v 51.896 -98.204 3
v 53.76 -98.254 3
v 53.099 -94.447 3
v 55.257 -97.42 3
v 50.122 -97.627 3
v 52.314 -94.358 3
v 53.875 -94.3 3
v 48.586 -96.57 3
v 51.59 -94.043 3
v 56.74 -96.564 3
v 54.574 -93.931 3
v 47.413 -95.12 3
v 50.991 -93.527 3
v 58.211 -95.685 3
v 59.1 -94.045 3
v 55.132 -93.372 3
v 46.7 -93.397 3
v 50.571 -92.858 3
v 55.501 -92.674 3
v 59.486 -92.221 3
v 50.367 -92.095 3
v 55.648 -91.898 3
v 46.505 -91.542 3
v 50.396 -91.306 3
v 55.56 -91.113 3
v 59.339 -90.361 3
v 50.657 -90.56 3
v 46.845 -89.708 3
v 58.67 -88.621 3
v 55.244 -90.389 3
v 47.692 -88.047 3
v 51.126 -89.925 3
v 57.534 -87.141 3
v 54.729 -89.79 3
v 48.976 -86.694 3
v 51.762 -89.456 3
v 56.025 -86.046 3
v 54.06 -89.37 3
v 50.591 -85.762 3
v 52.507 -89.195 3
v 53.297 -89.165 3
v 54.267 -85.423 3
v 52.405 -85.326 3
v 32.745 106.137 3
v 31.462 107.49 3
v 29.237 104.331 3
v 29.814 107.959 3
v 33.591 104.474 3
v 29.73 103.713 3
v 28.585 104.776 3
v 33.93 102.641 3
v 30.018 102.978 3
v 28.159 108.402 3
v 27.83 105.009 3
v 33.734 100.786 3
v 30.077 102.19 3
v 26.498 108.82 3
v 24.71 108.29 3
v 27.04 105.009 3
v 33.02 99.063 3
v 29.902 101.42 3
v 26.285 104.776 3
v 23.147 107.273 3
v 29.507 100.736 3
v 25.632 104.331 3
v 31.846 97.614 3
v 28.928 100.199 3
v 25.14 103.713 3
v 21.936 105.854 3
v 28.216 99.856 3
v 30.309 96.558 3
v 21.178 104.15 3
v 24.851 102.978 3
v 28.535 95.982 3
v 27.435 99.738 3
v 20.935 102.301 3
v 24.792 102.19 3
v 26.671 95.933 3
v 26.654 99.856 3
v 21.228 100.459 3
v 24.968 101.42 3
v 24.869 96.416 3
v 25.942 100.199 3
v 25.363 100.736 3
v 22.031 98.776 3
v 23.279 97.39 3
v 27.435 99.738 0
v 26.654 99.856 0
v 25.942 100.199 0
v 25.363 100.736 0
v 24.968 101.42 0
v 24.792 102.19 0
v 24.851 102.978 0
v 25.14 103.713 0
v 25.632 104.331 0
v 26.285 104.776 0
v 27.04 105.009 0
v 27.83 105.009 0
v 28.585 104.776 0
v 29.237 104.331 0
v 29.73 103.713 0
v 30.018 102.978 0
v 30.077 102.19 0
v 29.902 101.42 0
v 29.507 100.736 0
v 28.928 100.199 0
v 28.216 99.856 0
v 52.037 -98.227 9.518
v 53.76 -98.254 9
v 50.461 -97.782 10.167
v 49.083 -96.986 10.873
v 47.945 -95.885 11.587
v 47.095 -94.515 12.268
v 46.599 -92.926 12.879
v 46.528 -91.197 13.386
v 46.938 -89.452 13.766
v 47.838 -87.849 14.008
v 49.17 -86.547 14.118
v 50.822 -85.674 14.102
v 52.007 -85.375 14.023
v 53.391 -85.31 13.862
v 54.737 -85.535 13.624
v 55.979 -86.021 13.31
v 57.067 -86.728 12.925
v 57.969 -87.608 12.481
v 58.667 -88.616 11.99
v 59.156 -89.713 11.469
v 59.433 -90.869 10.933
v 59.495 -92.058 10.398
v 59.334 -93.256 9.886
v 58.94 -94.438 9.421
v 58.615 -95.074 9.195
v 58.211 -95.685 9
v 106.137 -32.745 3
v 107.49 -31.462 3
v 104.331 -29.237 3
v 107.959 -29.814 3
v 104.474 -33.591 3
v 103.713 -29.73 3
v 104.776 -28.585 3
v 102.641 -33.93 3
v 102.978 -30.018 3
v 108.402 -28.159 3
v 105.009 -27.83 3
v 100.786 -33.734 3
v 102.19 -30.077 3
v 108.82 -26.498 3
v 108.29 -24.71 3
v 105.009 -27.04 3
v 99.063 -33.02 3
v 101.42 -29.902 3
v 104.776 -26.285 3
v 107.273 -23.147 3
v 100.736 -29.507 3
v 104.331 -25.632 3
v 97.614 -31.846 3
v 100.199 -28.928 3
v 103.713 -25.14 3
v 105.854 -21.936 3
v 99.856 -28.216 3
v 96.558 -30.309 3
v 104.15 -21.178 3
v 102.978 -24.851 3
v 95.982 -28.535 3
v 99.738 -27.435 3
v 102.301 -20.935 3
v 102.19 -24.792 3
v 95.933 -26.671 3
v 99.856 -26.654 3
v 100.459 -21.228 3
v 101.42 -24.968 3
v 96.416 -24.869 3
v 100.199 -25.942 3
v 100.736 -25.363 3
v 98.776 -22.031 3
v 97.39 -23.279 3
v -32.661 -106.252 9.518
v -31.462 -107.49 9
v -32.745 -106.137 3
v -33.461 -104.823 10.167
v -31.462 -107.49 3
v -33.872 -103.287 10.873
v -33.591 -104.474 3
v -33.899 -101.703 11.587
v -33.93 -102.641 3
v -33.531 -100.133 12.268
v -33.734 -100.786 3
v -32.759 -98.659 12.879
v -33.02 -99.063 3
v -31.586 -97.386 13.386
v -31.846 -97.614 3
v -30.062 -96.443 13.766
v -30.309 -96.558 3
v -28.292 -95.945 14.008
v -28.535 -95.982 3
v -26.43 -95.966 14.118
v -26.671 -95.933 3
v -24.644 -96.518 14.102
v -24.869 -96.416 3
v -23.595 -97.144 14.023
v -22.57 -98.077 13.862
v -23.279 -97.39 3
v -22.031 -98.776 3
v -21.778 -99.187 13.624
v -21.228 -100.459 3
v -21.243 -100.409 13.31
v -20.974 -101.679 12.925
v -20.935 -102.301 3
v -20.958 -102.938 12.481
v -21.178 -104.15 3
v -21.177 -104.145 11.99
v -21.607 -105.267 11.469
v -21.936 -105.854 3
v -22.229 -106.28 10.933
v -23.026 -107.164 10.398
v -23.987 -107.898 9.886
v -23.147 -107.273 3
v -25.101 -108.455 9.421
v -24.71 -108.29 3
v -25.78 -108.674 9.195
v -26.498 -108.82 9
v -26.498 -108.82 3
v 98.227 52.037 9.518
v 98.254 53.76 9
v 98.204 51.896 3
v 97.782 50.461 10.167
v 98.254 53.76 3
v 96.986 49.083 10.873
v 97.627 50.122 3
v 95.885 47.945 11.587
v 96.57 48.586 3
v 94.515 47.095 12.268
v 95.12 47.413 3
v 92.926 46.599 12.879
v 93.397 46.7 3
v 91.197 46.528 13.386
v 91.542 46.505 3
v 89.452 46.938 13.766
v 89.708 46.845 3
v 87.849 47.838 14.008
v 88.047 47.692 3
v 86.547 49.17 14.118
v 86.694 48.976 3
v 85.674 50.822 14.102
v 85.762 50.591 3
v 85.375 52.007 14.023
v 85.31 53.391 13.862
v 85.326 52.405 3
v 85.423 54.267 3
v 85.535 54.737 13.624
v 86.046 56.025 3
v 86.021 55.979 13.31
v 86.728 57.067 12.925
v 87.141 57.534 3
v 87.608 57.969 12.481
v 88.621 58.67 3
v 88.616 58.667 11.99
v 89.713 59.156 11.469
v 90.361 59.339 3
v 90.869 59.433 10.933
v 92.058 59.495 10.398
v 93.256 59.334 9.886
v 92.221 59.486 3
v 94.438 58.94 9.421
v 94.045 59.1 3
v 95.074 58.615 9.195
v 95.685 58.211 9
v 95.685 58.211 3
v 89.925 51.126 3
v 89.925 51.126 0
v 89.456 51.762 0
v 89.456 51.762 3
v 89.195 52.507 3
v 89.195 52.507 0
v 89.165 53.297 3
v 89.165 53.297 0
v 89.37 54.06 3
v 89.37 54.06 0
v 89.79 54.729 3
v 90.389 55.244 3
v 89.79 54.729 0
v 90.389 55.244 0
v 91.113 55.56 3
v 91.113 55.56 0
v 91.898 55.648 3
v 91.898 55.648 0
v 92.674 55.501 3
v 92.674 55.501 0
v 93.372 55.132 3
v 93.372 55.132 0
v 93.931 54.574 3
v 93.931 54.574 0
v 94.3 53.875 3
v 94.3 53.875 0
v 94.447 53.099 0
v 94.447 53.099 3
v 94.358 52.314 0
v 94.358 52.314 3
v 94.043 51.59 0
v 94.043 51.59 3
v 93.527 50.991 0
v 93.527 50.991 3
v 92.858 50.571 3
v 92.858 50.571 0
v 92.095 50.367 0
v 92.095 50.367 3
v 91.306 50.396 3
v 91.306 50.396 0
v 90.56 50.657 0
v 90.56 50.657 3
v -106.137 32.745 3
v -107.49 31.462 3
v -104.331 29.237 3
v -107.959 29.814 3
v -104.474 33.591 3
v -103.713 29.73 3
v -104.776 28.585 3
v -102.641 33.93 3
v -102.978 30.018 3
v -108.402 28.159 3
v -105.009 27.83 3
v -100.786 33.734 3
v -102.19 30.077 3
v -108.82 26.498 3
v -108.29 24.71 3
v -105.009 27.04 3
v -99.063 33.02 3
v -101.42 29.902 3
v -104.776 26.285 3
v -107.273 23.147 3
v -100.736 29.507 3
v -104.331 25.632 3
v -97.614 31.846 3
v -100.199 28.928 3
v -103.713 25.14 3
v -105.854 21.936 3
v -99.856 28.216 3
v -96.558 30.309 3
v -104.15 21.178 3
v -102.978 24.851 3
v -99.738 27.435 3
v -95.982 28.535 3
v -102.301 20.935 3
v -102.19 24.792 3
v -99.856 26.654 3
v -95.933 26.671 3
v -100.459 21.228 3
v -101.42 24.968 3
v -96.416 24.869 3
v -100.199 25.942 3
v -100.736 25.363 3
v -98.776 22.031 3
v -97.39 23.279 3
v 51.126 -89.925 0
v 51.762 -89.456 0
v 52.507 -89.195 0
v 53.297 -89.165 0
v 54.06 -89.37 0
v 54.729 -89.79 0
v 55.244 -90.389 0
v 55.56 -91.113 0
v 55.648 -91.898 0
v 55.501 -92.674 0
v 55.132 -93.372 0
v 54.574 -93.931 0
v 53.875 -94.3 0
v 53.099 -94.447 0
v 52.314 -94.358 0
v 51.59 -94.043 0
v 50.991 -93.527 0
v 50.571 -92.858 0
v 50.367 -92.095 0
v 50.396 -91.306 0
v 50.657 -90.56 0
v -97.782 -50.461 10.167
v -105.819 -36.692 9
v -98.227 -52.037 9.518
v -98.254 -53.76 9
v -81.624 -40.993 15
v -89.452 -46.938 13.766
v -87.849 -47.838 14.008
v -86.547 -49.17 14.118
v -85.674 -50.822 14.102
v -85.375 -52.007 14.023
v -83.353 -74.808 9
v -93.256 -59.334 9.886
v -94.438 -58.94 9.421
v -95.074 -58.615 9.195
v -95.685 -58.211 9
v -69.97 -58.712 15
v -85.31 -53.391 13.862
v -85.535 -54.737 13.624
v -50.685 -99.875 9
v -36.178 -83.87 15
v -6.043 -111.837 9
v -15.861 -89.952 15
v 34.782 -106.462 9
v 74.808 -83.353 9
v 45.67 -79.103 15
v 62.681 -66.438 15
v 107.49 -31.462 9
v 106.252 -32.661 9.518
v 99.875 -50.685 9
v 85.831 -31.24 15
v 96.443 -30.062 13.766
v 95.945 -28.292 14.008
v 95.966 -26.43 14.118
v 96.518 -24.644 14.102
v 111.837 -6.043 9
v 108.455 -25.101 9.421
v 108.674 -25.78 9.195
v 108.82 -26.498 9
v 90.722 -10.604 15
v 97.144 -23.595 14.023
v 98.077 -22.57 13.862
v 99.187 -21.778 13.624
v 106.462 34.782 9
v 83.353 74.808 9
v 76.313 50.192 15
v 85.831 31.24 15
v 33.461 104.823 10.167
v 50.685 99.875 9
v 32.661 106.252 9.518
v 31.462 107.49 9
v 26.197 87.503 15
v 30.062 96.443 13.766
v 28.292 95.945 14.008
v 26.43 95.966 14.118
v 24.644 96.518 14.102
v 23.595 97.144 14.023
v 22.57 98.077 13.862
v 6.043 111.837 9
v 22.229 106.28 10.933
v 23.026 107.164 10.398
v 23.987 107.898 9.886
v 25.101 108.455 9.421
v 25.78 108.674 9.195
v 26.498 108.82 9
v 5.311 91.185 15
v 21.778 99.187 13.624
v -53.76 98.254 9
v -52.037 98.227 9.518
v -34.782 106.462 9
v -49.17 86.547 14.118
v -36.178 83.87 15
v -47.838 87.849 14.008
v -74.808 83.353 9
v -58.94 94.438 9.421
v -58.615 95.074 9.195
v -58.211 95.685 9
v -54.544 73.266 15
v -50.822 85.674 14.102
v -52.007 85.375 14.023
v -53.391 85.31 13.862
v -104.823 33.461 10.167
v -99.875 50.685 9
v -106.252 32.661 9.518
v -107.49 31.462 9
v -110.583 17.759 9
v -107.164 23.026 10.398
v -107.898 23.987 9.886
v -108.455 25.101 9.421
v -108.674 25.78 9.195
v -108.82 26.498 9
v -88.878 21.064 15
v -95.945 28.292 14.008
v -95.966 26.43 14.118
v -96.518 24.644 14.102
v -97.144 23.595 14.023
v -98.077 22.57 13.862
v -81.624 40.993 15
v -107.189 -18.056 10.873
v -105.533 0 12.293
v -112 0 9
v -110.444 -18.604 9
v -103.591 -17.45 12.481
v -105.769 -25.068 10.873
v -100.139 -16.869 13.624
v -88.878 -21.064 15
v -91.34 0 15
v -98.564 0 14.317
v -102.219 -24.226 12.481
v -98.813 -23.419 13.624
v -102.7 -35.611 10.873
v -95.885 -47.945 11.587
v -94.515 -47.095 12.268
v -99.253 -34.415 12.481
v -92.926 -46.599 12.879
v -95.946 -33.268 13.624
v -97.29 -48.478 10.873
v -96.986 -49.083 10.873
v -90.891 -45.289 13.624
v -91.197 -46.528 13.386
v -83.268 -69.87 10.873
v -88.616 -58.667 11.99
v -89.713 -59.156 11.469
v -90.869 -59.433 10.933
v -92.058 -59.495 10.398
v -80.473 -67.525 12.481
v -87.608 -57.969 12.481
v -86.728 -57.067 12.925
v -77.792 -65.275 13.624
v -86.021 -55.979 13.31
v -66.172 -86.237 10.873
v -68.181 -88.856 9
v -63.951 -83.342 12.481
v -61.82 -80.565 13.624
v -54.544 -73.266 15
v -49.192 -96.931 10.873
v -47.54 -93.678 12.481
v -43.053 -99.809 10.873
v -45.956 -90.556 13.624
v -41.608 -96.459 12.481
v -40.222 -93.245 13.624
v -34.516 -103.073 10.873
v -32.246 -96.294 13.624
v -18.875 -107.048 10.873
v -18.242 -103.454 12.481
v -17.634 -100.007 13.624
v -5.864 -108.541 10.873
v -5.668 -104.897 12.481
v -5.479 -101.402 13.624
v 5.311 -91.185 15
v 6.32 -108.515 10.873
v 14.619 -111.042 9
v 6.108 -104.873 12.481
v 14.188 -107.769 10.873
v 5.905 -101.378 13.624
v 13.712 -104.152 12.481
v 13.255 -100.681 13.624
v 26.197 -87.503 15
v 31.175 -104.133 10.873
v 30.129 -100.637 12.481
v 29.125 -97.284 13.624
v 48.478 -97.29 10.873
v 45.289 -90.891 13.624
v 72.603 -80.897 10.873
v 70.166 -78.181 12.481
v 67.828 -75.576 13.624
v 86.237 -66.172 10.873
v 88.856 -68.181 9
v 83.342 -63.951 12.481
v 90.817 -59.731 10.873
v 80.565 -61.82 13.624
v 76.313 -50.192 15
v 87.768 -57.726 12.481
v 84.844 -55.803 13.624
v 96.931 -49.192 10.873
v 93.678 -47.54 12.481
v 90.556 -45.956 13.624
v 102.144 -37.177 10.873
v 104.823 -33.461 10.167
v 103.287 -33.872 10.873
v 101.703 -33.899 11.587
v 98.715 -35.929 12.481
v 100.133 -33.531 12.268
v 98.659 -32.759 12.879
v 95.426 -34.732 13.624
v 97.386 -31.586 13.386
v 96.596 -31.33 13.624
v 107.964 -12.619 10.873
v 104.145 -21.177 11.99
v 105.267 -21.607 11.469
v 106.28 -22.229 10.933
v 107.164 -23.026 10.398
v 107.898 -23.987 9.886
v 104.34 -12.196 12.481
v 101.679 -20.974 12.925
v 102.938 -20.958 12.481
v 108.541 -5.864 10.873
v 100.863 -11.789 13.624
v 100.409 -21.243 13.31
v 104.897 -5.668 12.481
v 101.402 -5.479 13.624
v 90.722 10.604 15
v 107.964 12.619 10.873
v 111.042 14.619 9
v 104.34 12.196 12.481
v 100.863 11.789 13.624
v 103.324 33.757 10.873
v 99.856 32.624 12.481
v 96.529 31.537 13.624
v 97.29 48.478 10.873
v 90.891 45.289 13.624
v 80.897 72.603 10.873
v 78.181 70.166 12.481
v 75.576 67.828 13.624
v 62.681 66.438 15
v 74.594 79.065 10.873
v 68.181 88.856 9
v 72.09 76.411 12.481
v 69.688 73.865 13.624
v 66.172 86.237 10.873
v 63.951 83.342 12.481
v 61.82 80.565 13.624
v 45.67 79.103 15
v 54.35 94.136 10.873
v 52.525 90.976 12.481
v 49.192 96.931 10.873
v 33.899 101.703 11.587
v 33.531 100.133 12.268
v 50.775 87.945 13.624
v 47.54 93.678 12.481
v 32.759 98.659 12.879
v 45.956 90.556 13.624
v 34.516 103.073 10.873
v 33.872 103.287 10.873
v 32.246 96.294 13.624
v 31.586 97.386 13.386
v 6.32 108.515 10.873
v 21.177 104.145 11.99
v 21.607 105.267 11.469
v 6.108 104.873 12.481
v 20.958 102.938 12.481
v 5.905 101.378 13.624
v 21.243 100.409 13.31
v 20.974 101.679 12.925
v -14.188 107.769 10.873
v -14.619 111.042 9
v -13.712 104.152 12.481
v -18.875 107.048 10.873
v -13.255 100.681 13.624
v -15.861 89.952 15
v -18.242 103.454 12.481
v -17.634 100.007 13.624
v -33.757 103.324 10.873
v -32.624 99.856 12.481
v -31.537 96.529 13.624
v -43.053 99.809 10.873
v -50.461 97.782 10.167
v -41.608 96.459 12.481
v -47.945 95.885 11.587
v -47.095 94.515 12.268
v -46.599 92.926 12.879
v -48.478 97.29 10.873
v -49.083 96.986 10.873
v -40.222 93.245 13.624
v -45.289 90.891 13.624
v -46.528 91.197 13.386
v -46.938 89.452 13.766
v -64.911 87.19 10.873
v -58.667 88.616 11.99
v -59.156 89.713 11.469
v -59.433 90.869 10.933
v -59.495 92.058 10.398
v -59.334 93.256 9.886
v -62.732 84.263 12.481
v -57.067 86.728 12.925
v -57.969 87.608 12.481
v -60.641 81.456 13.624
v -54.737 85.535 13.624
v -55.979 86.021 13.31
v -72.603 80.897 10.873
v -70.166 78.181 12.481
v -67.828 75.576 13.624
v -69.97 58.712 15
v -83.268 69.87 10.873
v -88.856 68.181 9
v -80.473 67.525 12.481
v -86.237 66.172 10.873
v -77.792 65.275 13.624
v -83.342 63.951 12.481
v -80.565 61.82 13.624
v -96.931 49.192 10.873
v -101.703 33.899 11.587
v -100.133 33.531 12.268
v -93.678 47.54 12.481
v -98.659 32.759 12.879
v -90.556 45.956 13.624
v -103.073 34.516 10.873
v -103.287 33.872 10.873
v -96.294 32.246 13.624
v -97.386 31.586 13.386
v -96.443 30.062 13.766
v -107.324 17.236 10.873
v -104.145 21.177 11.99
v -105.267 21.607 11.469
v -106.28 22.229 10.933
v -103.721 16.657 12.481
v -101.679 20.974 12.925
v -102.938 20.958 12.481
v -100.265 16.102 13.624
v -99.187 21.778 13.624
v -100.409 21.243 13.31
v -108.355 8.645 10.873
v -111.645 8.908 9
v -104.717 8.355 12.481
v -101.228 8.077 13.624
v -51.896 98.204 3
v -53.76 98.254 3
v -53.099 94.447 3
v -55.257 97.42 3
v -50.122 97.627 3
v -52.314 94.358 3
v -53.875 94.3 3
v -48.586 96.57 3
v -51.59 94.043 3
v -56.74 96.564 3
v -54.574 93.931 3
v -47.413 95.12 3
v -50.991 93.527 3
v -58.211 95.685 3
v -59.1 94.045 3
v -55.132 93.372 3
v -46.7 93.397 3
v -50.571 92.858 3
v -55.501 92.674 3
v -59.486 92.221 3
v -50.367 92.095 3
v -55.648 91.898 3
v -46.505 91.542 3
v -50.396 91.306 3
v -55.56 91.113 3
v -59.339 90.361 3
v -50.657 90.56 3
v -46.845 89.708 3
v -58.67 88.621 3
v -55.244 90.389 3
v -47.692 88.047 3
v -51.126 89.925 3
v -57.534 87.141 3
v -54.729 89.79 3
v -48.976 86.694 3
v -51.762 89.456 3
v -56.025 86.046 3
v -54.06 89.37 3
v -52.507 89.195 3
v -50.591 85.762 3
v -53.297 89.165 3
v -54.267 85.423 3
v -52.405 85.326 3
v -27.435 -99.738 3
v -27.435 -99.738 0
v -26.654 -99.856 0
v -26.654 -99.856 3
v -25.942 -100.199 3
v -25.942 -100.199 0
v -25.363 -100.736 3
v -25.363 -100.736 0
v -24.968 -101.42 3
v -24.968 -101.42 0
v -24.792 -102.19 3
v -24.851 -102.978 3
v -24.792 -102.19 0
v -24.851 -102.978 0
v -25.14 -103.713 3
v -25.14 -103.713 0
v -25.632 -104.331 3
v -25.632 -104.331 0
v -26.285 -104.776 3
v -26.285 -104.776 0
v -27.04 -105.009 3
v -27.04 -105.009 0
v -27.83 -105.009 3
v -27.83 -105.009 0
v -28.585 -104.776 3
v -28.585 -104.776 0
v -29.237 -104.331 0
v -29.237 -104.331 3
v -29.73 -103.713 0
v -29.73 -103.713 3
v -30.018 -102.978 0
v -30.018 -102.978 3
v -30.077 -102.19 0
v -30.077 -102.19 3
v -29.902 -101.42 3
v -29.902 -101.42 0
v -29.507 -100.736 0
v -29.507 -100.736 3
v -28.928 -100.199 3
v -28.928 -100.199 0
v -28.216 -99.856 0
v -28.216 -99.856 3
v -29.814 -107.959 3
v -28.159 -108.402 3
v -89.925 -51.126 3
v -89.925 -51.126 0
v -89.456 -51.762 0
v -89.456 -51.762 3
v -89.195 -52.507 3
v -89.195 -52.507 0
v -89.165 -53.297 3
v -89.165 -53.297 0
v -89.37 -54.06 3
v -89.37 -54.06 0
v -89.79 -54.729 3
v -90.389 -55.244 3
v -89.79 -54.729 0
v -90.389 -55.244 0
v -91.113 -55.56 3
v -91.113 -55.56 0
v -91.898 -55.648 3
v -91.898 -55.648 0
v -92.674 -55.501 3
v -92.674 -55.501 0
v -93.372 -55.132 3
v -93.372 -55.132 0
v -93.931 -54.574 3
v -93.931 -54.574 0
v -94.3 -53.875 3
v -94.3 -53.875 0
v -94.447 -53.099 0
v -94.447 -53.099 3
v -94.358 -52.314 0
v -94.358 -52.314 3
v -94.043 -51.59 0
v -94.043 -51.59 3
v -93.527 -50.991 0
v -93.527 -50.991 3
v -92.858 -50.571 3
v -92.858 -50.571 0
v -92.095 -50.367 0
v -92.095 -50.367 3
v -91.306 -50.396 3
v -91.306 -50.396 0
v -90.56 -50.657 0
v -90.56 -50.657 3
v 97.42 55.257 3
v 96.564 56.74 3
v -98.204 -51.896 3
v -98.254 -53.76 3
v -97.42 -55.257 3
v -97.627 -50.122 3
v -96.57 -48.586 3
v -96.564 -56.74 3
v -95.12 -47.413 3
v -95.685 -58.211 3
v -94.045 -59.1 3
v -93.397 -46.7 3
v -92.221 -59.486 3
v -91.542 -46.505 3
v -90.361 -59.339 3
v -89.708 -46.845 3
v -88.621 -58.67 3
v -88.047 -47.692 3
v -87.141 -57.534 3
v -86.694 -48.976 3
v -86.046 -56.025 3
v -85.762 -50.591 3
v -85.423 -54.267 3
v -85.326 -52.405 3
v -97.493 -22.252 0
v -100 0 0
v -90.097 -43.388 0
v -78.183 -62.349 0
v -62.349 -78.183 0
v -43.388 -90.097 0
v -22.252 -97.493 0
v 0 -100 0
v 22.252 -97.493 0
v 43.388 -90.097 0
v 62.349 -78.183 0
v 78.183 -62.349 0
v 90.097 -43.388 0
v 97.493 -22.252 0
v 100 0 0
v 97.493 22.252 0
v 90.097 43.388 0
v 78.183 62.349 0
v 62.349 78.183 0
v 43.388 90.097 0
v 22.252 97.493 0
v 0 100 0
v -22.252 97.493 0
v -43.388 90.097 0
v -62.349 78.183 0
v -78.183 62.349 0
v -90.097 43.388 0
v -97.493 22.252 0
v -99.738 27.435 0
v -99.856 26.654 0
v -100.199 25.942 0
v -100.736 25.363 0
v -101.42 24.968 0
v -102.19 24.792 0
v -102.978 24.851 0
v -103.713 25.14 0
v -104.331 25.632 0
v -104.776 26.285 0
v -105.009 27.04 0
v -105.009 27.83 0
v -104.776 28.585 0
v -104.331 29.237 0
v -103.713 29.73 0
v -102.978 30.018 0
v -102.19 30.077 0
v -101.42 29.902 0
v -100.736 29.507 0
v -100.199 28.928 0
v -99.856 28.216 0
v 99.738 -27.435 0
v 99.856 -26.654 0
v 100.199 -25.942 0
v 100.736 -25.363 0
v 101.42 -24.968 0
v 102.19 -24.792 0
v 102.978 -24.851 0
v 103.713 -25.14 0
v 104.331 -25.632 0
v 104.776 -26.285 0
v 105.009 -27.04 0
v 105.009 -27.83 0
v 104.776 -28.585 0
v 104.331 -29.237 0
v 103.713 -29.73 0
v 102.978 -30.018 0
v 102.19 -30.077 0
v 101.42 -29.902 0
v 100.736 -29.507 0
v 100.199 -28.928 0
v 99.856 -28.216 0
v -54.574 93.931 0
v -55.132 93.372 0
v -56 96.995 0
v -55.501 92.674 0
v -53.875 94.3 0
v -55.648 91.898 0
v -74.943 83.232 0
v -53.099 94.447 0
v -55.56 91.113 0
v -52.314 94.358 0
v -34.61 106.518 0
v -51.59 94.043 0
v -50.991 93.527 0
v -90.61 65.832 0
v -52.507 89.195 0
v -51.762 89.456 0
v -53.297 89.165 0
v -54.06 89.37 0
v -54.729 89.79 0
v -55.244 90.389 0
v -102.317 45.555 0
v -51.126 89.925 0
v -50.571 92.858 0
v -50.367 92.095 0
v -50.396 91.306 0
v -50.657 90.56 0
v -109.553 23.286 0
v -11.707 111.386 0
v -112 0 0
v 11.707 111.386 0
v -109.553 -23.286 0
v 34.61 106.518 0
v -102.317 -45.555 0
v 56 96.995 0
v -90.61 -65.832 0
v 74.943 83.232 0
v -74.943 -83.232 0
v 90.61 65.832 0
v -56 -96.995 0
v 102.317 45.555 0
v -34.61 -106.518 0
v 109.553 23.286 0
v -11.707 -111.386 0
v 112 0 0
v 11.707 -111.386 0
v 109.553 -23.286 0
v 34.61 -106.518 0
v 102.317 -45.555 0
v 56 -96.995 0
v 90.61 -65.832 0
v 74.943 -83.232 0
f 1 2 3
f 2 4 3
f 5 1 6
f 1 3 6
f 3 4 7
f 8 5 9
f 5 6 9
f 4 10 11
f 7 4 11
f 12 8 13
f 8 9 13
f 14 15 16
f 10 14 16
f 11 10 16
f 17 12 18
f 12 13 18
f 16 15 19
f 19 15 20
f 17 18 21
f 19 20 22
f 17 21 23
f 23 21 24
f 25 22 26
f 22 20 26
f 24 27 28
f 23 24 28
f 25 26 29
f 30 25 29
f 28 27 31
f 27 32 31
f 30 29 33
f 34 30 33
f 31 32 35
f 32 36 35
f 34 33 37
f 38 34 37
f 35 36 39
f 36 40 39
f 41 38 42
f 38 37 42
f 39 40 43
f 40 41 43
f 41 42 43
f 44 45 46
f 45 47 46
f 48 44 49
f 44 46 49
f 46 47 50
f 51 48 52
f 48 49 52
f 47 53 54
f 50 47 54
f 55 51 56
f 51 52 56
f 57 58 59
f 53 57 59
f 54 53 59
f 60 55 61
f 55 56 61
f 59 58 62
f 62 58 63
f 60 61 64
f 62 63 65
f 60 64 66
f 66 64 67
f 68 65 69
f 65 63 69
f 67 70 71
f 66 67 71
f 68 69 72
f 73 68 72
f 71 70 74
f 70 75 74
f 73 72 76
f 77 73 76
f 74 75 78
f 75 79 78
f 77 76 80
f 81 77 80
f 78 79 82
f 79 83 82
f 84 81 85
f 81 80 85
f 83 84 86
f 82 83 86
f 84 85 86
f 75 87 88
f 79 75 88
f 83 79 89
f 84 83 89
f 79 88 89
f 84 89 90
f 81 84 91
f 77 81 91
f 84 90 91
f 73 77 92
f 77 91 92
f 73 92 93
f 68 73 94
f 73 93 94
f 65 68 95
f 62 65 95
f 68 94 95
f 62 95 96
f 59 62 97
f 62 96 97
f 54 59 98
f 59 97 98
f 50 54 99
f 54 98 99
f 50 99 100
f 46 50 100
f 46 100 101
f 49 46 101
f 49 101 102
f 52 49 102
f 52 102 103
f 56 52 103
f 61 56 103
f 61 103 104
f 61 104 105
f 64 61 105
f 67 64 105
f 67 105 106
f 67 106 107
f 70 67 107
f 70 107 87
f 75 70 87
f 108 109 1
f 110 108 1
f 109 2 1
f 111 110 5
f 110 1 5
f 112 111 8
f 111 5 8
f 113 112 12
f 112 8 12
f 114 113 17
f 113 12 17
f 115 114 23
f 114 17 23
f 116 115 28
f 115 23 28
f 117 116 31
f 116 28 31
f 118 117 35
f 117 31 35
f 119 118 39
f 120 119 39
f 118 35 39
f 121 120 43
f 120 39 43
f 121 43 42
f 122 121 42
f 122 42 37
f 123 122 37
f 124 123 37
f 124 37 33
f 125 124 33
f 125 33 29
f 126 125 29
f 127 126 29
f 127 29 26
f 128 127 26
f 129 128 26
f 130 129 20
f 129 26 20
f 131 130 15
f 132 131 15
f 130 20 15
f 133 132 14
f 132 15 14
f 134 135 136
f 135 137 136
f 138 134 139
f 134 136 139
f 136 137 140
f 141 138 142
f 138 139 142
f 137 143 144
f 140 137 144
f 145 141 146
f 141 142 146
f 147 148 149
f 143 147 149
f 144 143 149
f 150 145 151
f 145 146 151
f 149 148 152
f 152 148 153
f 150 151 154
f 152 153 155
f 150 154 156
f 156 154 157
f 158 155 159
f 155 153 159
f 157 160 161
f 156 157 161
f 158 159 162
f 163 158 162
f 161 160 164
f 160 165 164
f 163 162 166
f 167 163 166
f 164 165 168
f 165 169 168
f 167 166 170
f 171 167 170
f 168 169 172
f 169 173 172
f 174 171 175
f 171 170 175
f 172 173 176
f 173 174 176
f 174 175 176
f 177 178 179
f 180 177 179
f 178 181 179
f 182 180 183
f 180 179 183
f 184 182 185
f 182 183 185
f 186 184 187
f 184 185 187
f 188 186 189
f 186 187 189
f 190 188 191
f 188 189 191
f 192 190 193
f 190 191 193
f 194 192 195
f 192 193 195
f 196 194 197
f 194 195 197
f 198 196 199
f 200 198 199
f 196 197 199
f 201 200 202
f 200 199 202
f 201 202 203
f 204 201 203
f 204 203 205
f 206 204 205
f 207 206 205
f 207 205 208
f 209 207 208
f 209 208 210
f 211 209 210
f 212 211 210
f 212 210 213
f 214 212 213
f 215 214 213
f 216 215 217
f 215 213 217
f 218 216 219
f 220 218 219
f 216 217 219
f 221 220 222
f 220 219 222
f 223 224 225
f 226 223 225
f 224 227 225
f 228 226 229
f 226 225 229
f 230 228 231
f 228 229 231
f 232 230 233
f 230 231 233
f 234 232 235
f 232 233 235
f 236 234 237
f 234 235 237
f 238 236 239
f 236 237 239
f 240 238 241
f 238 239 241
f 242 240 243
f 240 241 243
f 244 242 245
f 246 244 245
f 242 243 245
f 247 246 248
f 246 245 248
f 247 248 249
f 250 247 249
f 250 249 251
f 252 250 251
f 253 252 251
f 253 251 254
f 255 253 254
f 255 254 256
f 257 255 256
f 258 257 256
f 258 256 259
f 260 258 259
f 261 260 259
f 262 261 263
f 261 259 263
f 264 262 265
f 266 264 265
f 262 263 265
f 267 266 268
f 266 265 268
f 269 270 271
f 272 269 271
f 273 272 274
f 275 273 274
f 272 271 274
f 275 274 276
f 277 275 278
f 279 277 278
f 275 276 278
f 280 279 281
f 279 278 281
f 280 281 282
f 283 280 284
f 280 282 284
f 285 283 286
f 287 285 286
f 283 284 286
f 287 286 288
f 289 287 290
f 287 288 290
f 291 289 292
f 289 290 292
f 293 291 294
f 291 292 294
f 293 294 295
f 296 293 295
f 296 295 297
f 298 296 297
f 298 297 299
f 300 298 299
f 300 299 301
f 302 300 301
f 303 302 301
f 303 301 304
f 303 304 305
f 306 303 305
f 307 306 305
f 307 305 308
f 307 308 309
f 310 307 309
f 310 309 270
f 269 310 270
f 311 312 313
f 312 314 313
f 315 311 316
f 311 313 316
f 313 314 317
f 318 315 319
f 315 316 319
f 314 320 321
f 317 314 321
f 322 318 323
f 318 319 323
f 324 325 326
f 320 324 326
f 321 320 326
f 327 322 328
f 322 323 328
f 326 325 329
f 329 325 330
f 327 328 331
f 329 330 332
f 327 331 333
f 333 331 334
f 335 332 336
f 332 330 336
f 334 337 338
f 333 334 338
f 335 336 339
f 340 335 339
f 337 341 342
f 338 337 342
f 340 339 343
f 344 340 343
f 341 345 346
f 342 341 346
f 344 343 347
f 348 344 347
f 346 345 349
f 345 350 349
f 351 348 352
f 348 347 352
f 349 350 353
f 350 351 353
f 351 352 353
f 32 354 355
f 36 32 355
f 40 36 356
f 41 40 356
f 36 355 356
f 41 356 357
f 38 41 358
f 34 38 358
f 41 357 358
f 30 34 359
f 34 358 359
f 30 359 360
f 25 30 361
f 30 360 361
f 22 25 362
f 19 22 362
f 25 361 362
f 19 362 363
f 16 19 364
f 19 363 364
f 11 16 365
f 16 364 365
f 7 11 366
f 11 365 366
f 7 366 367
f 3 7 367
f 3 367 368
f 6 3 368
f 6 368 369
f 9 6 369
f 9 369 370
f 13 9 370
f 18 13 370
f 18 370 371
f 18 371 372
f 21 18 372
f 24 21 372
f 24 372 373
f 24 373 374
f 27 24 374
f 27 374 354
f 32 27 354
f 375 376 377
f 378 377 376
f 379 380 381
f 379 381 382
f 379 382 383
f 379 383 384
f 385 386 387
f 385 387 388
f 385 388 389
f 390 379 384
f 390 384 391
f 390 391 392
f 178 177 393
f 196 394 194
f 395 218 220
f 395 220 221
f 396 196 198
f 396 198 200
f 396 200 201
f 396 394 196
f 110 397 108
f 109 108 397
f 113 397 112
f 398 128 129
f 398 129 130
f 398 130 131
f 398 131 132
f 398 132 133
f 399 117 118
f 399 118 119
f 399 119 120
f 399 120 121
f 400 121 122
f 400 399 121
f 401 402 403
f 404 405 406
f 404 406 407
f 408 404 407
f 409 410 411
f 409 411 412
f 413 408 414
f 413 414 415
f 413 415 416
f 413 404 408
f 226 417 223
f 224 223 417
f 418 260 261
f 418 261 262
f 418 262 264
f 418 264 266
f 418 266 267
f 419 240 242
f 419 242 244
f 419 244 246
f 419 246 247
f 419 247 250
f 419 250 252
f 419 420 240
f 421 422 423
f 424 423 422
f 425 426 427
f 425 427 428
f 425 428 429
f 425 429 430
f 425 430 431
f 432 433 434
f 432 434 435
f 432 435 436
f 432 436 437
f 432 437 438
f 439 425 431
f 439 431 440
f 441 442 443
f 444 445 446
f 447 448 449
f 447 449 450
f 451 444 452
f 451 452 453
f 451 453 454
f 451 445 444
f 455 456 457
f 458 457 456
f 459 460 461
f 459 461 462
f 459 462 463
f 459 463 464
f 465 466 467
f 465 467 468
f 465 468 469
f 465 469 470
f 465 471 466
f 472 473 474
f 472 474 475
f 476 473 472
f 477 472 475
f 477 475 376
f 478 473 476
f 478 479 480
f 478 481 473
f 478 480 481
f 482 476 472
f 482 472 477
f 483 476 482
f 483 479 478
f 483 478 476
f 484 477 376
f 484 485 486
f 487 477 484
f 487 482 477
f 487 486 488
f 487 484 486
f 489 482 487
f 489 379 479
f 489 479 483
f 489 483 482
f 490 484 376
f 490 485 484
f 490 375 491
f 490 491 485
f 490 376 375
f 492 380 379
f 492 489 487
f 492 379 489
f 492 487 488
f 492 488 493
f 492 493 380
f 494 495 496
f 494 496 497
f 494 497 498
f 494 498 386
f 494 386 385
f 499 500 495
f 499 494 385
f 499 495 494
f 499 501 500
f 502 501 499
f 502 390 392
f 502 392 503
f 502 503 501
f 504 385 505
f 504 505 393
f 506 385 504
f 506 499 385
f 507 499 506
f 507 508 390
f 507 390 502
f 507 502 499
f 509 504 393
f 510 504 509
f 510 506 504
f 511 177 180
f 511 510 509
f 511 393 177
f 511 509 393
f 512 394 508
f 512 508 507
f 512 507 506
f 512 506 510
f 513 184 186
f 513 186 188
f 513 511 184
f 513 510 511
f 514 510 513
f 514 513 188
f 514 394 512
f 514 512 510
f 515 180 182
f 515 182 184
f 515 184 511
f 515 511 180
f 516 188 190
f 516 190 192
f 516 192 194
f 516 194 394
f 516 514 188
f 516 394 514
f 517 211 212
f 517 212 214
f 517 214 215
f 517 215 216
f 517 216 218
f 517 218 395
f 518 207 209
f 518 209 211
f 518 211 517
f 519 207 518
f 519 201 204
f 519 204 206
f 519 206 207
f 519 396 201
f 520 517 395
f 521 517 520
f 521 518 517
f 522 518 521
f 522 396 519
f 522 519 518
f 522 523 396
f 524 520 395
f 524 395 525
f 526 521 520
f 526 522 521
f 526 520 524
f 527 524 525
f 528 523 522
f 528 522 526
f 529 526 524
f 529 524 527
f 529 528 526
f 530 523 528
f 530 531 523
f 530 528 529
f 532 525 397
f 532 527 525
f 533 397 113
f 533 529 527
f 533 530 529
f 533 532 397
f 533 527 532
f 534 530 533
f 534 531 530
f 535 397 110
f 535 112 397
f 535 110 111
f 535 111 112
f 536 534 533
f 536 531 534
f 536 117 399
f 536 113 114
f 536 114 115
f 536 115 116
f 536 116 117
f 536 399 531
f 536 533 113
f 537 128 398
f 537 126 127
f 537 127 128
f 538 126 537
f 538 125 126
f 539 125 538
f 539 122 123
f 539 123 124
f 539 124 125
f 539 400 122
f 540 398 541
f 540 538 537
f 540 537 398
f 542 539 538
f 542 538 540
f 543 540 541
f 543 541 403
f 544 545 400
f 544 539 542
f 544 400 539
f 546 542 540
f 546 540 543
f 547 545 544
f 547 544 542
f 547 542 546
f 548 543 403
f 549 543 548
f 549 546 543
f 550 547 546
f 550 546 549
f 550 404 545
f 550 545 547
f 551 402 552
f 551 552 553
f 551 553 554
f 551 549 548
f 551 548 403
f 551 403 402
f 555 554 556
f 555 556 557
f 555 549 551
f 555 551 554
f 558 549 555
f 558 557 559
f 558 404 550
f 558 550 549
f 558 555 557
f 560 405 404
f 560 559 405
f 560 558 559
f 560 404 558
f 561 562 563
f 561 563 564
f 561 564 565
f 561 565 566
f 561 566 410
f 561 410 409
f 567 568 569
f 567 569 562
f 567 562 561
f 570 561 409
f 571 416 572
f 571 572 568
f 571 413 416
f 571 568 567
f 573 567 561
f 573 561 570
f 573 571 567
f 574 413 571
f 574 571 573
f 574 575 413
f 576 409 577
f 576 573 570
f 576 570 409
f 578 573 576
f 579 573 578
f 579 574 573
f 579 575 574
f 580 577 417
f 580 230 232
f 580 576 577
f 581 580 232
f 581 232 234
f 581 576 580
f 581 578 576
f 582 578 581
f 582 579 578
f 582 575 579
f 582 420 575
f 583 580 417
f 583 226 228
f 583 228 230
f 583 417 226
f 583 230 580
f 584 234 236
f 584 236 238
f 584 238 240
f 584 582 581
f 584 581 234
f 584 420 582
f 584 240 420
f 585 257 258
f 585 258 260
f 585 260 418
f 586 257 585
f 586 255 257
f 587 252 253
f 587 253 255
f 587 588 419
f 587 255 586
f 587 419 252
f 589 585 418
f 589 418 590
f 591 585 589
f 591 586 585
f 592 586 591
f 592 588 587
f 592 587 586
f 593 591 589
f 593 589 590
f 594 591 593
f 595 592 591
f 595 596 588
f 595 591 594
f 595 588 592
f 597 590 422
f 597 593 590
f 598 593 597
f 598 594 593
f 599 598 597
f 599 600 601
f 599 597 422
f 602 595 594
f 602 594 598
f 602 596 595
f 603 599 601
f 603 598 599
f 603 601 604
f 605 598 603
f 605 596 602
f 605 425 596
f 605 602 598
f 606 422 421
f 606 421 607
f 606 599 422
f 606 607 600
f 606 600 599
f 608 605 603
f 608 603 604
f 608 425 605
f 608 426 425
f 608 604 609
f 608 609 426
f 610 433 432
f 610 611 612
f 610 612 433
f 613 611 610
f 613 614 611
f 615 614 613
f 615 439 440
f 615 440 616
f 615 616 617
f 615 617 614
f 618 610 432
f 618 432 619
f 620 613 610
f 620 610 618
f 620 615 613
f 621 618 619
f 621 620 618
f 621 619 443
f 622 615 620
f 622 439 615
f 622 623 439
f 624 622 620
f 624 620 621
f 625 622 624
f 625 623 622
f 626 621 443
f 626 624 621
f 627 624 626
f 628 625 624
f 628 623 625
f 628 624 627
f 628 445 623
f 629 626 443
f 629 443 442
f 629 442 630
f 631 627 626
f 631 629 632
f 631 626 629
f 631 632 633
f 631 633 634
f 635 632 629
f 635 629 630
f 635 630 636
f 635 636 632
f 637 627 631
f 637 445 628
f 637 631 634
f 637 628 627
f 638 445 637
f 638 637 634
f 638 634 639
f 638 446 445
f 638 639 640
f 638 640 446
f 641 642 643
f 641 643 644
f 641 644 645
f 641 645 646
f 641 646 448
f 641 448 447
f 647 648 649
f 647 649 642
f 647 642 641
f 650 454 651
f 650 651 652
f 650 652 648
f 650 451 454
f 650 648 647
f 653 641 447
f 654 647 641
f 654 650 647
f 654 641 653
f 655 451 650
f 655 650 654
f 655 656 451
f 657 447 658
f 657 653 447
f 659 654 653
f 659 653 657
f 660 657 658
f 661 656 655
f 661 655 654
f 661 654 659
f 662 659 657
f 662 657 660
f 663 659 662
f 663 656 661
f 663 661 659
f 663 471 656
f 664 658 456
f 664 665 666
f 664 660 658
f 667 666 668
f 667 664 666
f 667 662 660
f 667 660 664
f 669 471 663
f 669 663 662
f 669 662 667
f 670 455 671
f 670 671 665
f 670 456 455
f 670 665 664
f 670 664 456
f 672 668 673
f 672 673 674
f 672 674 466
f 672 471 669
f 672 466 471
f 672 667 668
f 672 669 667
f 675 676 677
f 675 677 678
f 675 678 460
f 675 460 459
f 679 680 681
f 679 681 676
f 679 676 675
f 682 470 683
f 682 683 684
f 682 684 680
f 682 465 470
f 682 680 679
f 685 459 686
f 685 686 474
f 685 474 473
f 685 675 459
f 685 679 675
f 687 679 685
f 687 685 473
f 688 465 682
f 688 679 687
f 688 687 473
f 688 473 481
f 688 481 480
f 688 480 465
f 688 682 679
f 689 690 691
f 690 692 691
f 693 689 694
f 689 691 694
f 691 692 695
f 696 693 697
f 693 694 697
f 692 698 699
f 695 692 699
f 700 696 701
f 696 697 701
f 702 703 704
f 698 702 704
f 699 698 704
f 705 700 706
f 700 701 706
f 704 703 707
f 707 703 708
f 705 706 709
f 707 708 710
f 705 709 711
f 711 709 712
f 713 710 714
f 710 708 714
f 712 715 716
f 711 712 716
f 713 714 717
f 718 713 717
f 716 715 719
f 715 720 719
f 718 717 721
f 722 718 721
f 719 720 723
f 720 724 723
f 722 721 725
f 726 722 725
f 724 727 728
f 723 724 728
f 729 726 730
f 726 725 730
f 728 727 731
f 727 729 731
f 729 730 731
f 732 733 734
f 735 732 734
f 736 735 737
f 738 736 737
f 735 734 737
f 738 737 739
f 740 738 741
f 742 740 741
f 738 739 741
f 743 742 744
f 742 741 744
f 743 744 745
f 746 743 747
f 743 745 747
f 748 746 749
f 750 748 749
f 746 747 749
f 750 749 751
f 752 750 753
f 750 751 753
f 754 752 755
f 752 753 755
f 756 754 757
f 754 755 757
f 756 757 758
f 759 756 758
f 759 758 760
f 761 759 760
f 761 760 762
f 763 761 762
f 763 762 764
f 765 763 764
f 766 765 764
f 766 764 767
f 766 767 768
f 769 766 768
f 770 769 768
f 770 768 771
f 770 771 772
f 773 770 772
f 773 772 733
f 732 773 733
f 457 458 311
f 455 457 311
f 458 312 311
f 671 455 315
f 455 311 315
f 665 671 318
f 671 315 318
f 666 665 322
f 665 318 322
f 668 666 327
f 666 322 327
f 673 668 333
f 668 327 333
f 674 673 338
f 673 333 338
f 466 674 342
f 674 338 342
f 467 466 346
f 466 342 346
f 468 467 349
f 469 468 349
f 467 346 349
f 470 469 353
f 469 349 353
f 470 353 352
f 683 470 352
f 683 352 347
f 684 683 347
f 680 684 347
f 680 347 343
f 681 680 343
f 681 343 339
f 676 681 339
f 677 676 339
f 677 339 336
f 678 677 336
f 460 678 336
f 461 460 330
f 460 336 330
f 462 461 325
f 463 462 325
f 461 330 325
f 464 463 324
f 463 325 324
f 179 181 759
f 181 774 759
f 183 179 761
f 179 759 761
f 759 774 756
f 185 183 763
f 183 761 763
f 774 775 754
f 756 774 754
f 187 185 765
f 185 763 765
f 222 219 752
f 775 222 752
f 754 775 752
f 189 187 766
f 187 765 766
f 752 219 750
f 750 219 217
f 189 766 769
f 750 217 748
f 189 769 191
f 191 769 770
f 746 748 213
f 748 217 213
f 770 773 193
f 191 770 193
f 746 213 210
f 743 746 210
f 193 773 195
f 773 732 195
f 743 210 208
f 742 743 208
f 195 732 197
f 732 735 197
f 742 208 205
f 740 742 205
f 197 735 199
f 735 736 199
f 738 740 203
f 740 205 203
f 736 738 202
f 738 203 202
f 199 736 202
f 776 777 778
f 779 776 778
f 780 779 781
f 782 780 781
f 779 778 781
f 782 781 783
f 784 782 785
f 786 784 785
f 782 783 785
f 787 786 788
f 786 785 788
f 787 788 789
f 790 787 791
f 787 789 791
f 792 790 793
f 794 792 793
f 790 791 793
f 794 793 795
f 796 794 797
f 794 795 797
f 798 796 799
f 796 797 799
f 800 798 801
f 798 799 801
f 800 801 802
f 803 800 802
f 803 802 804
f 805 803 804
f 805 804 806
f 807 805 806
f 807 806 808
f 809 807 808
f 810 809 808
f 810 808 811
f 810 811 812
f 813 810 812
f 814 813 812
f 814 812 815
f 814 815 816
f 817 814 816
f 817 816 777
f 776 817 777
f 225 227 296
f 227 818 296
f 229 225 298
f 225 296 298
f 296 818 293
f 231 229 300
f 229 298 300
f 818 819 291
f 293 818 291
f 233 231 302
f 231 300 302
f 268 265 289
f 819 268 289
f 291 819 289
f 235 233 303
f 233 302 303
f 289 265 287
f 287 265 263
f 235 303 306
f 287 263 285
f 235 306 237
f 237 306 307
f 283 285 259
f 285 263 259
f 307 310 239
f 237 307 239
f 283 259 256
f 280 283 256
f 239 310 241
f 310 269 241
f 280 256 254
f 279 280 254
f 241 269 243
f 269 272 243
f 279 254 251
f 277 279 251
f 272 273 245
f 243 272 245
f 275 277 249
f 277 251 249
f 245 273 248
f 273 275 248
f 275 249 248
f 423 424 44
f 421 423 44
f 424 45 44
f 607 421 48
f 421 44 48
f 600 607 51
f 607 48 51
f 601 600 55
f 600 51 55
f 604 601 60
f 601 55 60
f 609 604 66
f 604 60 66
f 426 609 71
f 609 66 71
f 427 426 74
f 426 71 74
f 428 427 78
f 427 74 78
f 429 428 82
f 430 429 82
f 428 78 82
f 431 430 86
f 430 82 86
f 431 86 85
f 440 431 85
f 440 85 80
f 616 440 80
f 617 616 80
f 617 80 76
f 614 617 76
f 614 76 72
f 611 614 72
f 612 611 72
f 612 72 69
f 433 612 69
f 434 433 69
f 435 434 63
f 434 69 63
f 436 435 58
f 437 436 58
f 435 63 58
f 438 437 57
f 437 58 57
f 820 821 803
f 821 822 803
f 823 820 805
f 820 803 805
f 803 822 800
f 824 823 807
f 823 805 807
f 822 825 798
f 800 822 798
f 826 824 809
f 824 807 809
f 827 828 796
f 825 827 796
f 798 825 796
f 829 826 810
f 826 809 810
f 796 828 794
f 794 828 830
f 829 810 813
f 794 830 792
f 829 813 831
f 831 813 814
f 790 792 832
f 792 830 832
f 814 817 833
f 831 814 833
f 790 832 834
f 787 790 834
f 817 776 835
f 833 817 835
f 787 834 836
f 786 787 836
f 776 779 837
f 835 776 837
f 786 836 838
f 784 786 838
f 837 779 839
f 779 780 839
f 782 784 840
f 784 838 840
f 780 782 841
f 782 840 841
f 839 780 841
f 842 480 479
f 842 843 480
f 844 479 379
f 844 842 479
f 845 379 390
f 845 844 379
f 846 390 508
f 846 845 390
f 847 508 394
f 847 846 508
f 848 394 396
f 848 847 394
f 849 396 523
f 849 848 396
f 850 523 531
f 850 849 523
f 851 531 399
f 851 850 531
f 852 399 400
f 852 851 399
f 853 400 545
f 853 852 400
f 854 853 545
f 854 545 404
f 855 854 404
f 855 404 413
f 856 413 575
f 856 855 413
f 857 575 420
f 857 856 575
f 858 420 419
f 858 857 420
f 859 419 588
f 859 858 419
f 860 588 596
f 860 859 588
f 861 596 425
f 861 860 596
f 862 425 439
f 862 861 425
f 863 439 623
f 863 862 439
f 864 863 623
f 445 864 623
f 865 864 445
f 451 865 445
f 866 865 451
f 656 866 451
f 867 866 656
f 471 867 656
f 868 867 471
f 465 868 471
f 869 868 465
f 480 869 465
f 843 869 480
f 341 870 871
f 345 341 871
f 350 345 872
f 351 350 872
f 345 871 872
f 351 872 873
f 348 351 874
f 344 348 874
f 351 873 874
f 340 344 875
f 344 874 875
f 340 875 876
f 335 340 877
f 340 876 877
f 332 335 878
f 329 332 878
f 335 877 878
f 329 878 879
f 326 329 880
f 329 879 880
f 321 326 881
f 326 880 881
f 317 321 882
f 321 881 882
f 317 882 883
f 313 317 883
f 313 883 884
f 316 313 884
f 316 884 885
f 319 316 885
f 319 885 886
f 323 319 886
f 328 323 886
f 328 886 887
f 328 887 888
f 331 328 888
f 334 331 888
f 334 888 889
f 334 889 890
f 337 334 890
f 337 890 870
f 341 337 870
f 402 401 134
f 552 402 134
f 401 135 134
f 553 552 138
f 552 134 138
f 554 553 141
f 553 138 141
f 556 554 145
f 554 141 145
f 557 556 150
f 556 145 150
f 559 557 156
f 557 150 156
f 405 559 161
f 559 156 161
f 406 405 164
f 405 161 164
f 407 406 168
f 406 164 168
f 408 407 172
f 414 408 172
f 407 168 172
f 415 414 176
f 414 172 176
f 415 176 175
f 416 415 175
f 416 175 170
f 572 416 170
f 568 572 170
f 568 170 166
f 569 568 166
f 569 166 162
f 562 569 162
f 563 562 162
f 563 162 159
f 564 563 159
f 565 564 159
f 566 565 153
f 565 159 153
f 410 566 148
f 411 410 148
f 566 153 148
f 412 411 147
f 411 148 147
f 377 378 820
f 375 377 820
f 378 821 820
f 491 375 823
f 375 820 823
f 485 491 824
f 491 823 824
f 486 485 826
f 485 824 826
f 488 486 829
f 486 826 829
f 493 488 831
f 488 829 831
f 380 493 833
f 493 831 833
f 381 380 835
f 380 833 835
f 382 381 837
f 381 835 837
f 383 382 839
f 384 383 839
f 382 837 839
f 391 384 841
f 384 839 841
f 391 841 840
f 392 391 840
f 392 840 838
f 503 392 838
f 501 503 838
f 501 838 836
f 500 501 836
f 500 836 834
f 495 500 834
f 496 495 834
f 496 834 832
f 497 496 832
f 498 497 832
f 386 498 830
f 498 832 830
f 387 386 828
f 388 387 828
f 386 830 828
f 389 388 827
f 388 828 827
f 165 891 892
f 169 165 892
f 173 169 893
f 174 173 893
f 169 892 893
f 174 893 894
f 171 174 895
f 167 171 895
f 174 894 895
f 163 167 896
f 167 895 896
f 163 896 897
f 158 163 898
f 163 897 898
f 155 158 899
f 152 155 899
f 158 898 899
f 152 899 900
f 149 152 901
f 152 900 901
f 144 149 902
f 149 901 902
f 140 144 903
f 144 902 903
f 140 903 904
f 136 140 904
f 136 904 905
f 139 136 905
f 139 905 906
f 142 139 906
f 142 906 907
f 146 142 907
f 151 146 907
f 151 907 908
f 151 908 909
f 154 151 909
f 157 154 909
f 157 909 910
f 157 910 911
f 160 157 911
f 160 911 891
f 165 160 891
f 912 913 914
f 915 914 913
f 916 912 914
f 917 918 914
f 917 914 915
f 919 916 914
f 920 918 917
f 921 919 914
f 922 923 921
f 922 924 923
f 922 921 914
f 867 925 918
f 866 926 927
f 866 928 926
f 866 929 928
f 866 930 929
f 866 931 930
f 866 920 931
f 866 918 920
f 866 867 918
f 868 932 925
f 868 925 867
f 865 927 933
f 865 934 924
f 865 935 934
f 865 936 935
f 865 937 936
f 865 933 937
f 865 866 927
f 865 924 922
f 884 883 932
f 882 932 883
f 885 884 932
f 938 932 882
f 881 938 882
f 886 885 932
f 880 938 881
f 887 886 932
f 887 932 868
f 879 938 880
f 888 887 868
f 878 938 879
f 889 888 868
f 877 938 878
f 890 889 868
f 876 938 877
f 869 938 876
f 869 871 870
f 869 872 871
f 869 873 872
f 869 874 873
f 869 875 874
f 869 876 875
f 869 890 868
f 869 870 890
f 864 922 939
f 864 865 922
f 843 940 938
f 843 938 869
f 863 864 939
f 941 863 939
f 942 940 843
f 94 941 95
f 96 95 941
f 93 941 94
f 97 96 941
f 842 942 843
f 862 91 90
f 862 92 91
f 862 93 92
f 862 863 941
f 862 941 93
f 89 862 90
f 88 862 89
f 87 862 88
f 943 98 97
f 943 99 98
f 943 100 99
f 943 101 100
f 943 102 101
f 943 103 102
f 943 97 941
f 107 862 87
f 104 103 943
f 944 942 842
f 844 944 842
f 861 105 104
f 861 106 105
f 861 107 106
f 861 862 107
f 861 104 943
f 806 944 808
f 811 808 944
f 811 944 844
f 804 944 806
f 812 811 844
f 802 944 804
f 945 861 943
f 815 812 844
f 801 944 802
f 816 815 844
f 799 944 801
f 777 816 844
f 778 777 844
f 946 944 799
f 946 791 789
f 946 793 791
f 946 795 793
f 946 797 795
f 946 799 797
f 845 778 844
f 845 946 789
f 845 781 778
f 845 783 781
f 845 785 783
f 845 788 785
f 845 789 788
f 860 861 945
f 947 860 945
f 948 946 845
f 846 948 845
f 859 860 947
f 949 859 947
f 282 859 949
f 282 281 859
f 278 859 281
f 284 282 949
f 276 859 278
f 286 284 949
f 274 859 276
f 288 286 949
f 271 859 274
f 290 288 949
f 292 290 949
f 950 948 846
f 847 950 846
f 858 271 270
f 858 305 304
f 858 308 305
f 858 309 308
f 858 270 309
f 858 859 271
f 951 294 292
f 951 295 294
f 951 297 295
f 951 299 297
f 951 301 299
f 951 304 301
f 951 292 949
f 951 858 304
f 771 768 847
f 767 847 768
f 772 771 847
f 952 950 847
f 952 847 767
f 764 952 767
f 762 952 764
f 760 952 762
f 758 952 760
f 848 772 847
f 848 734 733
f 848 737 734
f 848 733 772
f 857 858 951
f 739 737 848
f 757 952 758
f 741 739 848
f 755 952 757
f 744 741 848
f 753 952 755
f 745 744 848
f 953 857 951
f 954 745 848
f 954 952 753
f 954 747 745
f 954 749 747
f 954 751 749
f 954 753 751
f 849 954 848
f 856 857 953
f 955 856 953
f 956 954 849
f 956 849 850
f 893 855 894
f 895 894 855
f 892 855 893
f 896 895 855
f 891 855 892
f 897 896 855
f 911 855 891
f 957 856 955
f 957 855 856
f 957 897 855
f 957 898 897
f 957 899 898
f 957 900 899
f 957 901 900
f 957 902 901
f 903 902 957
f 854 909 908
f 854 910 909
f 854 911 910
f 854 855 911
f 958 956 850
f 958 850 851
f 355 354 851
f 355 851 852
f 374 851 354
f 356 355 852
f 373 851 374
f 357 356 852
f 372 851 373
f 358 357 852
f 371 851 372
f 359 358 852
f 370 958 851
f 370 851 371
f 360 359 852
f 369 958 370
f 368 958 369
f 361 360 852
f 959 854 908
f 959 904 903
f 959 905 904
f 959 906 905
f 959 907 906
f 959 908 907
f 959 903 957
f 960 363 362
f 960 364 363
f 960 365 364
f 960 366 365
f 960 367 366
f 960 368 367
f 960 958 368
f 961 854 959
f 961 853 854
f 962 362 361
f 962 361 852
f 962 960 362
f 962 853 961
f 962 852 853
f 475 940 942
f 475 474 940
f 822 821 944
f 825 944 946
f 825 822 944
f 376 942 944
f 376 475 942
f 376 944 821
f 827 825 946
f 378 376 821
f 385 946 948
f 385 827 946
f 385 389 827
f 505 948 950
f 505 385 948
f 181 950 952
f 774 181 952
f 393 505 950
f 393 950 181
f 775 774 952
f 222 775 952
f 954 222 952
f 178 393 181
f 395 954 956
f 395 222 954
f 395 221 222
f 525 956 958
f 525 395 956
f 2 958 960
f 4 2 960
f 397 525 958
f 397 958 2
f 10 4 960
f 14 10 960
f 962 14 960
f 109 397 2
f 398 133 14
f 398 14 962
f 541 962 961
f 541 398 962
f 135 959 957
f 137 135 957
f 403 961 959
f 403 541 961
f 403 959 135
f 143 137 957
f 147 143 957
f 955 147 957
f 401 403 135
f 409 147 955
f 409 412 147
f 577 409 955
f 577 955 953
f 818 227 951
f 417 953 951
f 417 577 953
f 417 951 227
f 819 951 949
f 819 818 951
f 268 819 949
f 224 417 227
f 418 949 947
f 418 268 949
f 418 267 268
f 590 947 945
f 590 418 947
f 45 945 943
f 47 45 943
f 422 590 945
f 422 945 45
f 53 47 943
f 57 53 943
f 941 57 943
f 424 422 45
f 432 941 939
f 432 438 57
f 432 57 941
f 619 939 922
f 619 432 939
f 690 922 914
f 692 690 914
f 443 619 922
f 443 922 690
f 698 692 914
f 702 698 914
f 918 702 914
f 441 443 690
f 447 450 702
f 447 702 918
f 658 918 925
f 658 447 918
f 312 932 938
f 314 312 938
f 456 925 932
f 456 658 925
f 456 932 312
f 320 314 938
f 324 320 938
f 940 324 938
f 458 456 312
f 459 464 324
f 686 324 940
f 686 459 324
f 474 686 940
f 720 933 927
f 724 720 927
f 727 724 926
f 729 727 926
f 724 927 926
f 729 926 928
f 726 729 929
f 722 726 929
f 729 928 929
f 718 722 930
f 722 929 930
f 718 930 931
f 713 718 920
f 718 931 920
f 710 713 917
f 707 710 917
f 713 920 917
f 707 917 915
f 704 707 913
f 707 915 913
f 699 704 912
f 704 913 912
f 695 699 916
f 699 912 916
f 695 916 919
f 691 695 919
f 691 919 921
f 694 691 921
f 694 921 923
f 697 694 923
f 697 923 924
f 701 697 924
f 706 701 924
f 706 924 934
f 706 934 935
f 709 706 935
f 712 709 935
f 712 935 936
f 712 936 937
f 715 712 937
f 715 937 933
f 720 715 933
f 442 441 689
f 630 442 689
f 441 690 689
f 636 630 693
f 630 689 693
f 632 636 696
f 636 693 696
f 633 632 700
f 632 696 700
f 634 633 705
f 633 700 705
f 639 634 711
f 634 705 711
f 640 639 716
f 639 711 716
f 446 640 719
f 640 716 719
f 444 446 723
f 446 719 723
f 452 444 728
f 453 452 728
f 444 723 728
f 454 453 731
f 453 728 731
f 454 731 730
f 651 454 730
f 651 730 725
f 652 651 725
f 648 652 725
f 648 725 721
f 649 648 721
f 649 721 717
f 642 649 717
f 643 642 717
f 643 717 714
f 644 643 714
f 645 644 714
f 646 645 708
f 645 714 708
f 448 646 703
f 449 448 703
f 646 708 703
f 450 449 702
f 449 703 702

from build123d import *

# Parameters (mm, degrees)
SKETCH3_R          = 2.65
CUT_EXTRUDE1_DEPTH = 160.100597108
CUT_EXTRUDE2_START = -3
SKETCH4_R          = 6.5
CUT_EXTRUDE2_DEPTH = 157.100597258
CIRPATTERN1_COUNT  = 8


with BuildPart() as part:
    # Sketch2 → Revolve1 (revolve)
    with BuildSketch(Plane(origin=(0, 0, 0), x_dir=(1, 0, 0), z_dir=(0, 1, 0))):
        with BuildLine():
            Line((-100, 0), (-112, 0))
            Line((-112, 0), (-112, -9))
            ThreePointArc((-112, -9), (-102.096675088, -13.469639994), (-91.339745962, -15))
            Line((-91.339745962, -15), (-100, 0))
        make_face()
    revolve(axis=Axis((0, 0, 0), (0, 0, 1)))

    # Sketch3 → Cut-Extrude1 (cut, through all)
    with BuildSketch(Plane(origin=(0, 0, 0), x_dir=(-1, 0, 0), z_dir=(0, 0, -1))):
        with Locations((-102.388137587, -27.434818781)):
            Circle(SKETCH3_R)
    cut_extrude1 = extrude(amount=-CUT_EXTRUDE1_DEPTH, mode=Mode.SUBTRACT)

    # Sketch4 → Cut-Extrude2 (cut, through all)
    with BuildSketch(Plane(origin=(0, 0, 0), x_dir=(-1, 0, 0), z_dir=(0, 0, -1)).offset(CUT_EXTRUDE2_START)):
        with Locations((-102.388137587, -27.434818781)):
            Circle(SKETCH4_R)
    cut_extrude2 = extrude(amount=-CUT_EXTRUDE2_DEPTH, mode=Mode.SUBTRACT)

    # CirPattern1: Cut-Extrude1, Cut-Extrude2 ×8 about axis
    cirpattern1_axis = Axis((0, 0, 0), (0, 0, -1))
    add([cut_extrude1.rotate(cirpattern1_axis, i * 360 / CIRPATTERN1_COUNT) for i in range(1, CIRPATTERN1_COUNT)], mode=Mode.SUBTRACT)
    add([cut_extrude2.rotate(cirpattern1_axis, i * 360 / CIRPATTERN1_COUNT) for i in range(1, CIRPATTERN1_COUNT)], mode=Mode.SUBTRACT)


solid = part.part
